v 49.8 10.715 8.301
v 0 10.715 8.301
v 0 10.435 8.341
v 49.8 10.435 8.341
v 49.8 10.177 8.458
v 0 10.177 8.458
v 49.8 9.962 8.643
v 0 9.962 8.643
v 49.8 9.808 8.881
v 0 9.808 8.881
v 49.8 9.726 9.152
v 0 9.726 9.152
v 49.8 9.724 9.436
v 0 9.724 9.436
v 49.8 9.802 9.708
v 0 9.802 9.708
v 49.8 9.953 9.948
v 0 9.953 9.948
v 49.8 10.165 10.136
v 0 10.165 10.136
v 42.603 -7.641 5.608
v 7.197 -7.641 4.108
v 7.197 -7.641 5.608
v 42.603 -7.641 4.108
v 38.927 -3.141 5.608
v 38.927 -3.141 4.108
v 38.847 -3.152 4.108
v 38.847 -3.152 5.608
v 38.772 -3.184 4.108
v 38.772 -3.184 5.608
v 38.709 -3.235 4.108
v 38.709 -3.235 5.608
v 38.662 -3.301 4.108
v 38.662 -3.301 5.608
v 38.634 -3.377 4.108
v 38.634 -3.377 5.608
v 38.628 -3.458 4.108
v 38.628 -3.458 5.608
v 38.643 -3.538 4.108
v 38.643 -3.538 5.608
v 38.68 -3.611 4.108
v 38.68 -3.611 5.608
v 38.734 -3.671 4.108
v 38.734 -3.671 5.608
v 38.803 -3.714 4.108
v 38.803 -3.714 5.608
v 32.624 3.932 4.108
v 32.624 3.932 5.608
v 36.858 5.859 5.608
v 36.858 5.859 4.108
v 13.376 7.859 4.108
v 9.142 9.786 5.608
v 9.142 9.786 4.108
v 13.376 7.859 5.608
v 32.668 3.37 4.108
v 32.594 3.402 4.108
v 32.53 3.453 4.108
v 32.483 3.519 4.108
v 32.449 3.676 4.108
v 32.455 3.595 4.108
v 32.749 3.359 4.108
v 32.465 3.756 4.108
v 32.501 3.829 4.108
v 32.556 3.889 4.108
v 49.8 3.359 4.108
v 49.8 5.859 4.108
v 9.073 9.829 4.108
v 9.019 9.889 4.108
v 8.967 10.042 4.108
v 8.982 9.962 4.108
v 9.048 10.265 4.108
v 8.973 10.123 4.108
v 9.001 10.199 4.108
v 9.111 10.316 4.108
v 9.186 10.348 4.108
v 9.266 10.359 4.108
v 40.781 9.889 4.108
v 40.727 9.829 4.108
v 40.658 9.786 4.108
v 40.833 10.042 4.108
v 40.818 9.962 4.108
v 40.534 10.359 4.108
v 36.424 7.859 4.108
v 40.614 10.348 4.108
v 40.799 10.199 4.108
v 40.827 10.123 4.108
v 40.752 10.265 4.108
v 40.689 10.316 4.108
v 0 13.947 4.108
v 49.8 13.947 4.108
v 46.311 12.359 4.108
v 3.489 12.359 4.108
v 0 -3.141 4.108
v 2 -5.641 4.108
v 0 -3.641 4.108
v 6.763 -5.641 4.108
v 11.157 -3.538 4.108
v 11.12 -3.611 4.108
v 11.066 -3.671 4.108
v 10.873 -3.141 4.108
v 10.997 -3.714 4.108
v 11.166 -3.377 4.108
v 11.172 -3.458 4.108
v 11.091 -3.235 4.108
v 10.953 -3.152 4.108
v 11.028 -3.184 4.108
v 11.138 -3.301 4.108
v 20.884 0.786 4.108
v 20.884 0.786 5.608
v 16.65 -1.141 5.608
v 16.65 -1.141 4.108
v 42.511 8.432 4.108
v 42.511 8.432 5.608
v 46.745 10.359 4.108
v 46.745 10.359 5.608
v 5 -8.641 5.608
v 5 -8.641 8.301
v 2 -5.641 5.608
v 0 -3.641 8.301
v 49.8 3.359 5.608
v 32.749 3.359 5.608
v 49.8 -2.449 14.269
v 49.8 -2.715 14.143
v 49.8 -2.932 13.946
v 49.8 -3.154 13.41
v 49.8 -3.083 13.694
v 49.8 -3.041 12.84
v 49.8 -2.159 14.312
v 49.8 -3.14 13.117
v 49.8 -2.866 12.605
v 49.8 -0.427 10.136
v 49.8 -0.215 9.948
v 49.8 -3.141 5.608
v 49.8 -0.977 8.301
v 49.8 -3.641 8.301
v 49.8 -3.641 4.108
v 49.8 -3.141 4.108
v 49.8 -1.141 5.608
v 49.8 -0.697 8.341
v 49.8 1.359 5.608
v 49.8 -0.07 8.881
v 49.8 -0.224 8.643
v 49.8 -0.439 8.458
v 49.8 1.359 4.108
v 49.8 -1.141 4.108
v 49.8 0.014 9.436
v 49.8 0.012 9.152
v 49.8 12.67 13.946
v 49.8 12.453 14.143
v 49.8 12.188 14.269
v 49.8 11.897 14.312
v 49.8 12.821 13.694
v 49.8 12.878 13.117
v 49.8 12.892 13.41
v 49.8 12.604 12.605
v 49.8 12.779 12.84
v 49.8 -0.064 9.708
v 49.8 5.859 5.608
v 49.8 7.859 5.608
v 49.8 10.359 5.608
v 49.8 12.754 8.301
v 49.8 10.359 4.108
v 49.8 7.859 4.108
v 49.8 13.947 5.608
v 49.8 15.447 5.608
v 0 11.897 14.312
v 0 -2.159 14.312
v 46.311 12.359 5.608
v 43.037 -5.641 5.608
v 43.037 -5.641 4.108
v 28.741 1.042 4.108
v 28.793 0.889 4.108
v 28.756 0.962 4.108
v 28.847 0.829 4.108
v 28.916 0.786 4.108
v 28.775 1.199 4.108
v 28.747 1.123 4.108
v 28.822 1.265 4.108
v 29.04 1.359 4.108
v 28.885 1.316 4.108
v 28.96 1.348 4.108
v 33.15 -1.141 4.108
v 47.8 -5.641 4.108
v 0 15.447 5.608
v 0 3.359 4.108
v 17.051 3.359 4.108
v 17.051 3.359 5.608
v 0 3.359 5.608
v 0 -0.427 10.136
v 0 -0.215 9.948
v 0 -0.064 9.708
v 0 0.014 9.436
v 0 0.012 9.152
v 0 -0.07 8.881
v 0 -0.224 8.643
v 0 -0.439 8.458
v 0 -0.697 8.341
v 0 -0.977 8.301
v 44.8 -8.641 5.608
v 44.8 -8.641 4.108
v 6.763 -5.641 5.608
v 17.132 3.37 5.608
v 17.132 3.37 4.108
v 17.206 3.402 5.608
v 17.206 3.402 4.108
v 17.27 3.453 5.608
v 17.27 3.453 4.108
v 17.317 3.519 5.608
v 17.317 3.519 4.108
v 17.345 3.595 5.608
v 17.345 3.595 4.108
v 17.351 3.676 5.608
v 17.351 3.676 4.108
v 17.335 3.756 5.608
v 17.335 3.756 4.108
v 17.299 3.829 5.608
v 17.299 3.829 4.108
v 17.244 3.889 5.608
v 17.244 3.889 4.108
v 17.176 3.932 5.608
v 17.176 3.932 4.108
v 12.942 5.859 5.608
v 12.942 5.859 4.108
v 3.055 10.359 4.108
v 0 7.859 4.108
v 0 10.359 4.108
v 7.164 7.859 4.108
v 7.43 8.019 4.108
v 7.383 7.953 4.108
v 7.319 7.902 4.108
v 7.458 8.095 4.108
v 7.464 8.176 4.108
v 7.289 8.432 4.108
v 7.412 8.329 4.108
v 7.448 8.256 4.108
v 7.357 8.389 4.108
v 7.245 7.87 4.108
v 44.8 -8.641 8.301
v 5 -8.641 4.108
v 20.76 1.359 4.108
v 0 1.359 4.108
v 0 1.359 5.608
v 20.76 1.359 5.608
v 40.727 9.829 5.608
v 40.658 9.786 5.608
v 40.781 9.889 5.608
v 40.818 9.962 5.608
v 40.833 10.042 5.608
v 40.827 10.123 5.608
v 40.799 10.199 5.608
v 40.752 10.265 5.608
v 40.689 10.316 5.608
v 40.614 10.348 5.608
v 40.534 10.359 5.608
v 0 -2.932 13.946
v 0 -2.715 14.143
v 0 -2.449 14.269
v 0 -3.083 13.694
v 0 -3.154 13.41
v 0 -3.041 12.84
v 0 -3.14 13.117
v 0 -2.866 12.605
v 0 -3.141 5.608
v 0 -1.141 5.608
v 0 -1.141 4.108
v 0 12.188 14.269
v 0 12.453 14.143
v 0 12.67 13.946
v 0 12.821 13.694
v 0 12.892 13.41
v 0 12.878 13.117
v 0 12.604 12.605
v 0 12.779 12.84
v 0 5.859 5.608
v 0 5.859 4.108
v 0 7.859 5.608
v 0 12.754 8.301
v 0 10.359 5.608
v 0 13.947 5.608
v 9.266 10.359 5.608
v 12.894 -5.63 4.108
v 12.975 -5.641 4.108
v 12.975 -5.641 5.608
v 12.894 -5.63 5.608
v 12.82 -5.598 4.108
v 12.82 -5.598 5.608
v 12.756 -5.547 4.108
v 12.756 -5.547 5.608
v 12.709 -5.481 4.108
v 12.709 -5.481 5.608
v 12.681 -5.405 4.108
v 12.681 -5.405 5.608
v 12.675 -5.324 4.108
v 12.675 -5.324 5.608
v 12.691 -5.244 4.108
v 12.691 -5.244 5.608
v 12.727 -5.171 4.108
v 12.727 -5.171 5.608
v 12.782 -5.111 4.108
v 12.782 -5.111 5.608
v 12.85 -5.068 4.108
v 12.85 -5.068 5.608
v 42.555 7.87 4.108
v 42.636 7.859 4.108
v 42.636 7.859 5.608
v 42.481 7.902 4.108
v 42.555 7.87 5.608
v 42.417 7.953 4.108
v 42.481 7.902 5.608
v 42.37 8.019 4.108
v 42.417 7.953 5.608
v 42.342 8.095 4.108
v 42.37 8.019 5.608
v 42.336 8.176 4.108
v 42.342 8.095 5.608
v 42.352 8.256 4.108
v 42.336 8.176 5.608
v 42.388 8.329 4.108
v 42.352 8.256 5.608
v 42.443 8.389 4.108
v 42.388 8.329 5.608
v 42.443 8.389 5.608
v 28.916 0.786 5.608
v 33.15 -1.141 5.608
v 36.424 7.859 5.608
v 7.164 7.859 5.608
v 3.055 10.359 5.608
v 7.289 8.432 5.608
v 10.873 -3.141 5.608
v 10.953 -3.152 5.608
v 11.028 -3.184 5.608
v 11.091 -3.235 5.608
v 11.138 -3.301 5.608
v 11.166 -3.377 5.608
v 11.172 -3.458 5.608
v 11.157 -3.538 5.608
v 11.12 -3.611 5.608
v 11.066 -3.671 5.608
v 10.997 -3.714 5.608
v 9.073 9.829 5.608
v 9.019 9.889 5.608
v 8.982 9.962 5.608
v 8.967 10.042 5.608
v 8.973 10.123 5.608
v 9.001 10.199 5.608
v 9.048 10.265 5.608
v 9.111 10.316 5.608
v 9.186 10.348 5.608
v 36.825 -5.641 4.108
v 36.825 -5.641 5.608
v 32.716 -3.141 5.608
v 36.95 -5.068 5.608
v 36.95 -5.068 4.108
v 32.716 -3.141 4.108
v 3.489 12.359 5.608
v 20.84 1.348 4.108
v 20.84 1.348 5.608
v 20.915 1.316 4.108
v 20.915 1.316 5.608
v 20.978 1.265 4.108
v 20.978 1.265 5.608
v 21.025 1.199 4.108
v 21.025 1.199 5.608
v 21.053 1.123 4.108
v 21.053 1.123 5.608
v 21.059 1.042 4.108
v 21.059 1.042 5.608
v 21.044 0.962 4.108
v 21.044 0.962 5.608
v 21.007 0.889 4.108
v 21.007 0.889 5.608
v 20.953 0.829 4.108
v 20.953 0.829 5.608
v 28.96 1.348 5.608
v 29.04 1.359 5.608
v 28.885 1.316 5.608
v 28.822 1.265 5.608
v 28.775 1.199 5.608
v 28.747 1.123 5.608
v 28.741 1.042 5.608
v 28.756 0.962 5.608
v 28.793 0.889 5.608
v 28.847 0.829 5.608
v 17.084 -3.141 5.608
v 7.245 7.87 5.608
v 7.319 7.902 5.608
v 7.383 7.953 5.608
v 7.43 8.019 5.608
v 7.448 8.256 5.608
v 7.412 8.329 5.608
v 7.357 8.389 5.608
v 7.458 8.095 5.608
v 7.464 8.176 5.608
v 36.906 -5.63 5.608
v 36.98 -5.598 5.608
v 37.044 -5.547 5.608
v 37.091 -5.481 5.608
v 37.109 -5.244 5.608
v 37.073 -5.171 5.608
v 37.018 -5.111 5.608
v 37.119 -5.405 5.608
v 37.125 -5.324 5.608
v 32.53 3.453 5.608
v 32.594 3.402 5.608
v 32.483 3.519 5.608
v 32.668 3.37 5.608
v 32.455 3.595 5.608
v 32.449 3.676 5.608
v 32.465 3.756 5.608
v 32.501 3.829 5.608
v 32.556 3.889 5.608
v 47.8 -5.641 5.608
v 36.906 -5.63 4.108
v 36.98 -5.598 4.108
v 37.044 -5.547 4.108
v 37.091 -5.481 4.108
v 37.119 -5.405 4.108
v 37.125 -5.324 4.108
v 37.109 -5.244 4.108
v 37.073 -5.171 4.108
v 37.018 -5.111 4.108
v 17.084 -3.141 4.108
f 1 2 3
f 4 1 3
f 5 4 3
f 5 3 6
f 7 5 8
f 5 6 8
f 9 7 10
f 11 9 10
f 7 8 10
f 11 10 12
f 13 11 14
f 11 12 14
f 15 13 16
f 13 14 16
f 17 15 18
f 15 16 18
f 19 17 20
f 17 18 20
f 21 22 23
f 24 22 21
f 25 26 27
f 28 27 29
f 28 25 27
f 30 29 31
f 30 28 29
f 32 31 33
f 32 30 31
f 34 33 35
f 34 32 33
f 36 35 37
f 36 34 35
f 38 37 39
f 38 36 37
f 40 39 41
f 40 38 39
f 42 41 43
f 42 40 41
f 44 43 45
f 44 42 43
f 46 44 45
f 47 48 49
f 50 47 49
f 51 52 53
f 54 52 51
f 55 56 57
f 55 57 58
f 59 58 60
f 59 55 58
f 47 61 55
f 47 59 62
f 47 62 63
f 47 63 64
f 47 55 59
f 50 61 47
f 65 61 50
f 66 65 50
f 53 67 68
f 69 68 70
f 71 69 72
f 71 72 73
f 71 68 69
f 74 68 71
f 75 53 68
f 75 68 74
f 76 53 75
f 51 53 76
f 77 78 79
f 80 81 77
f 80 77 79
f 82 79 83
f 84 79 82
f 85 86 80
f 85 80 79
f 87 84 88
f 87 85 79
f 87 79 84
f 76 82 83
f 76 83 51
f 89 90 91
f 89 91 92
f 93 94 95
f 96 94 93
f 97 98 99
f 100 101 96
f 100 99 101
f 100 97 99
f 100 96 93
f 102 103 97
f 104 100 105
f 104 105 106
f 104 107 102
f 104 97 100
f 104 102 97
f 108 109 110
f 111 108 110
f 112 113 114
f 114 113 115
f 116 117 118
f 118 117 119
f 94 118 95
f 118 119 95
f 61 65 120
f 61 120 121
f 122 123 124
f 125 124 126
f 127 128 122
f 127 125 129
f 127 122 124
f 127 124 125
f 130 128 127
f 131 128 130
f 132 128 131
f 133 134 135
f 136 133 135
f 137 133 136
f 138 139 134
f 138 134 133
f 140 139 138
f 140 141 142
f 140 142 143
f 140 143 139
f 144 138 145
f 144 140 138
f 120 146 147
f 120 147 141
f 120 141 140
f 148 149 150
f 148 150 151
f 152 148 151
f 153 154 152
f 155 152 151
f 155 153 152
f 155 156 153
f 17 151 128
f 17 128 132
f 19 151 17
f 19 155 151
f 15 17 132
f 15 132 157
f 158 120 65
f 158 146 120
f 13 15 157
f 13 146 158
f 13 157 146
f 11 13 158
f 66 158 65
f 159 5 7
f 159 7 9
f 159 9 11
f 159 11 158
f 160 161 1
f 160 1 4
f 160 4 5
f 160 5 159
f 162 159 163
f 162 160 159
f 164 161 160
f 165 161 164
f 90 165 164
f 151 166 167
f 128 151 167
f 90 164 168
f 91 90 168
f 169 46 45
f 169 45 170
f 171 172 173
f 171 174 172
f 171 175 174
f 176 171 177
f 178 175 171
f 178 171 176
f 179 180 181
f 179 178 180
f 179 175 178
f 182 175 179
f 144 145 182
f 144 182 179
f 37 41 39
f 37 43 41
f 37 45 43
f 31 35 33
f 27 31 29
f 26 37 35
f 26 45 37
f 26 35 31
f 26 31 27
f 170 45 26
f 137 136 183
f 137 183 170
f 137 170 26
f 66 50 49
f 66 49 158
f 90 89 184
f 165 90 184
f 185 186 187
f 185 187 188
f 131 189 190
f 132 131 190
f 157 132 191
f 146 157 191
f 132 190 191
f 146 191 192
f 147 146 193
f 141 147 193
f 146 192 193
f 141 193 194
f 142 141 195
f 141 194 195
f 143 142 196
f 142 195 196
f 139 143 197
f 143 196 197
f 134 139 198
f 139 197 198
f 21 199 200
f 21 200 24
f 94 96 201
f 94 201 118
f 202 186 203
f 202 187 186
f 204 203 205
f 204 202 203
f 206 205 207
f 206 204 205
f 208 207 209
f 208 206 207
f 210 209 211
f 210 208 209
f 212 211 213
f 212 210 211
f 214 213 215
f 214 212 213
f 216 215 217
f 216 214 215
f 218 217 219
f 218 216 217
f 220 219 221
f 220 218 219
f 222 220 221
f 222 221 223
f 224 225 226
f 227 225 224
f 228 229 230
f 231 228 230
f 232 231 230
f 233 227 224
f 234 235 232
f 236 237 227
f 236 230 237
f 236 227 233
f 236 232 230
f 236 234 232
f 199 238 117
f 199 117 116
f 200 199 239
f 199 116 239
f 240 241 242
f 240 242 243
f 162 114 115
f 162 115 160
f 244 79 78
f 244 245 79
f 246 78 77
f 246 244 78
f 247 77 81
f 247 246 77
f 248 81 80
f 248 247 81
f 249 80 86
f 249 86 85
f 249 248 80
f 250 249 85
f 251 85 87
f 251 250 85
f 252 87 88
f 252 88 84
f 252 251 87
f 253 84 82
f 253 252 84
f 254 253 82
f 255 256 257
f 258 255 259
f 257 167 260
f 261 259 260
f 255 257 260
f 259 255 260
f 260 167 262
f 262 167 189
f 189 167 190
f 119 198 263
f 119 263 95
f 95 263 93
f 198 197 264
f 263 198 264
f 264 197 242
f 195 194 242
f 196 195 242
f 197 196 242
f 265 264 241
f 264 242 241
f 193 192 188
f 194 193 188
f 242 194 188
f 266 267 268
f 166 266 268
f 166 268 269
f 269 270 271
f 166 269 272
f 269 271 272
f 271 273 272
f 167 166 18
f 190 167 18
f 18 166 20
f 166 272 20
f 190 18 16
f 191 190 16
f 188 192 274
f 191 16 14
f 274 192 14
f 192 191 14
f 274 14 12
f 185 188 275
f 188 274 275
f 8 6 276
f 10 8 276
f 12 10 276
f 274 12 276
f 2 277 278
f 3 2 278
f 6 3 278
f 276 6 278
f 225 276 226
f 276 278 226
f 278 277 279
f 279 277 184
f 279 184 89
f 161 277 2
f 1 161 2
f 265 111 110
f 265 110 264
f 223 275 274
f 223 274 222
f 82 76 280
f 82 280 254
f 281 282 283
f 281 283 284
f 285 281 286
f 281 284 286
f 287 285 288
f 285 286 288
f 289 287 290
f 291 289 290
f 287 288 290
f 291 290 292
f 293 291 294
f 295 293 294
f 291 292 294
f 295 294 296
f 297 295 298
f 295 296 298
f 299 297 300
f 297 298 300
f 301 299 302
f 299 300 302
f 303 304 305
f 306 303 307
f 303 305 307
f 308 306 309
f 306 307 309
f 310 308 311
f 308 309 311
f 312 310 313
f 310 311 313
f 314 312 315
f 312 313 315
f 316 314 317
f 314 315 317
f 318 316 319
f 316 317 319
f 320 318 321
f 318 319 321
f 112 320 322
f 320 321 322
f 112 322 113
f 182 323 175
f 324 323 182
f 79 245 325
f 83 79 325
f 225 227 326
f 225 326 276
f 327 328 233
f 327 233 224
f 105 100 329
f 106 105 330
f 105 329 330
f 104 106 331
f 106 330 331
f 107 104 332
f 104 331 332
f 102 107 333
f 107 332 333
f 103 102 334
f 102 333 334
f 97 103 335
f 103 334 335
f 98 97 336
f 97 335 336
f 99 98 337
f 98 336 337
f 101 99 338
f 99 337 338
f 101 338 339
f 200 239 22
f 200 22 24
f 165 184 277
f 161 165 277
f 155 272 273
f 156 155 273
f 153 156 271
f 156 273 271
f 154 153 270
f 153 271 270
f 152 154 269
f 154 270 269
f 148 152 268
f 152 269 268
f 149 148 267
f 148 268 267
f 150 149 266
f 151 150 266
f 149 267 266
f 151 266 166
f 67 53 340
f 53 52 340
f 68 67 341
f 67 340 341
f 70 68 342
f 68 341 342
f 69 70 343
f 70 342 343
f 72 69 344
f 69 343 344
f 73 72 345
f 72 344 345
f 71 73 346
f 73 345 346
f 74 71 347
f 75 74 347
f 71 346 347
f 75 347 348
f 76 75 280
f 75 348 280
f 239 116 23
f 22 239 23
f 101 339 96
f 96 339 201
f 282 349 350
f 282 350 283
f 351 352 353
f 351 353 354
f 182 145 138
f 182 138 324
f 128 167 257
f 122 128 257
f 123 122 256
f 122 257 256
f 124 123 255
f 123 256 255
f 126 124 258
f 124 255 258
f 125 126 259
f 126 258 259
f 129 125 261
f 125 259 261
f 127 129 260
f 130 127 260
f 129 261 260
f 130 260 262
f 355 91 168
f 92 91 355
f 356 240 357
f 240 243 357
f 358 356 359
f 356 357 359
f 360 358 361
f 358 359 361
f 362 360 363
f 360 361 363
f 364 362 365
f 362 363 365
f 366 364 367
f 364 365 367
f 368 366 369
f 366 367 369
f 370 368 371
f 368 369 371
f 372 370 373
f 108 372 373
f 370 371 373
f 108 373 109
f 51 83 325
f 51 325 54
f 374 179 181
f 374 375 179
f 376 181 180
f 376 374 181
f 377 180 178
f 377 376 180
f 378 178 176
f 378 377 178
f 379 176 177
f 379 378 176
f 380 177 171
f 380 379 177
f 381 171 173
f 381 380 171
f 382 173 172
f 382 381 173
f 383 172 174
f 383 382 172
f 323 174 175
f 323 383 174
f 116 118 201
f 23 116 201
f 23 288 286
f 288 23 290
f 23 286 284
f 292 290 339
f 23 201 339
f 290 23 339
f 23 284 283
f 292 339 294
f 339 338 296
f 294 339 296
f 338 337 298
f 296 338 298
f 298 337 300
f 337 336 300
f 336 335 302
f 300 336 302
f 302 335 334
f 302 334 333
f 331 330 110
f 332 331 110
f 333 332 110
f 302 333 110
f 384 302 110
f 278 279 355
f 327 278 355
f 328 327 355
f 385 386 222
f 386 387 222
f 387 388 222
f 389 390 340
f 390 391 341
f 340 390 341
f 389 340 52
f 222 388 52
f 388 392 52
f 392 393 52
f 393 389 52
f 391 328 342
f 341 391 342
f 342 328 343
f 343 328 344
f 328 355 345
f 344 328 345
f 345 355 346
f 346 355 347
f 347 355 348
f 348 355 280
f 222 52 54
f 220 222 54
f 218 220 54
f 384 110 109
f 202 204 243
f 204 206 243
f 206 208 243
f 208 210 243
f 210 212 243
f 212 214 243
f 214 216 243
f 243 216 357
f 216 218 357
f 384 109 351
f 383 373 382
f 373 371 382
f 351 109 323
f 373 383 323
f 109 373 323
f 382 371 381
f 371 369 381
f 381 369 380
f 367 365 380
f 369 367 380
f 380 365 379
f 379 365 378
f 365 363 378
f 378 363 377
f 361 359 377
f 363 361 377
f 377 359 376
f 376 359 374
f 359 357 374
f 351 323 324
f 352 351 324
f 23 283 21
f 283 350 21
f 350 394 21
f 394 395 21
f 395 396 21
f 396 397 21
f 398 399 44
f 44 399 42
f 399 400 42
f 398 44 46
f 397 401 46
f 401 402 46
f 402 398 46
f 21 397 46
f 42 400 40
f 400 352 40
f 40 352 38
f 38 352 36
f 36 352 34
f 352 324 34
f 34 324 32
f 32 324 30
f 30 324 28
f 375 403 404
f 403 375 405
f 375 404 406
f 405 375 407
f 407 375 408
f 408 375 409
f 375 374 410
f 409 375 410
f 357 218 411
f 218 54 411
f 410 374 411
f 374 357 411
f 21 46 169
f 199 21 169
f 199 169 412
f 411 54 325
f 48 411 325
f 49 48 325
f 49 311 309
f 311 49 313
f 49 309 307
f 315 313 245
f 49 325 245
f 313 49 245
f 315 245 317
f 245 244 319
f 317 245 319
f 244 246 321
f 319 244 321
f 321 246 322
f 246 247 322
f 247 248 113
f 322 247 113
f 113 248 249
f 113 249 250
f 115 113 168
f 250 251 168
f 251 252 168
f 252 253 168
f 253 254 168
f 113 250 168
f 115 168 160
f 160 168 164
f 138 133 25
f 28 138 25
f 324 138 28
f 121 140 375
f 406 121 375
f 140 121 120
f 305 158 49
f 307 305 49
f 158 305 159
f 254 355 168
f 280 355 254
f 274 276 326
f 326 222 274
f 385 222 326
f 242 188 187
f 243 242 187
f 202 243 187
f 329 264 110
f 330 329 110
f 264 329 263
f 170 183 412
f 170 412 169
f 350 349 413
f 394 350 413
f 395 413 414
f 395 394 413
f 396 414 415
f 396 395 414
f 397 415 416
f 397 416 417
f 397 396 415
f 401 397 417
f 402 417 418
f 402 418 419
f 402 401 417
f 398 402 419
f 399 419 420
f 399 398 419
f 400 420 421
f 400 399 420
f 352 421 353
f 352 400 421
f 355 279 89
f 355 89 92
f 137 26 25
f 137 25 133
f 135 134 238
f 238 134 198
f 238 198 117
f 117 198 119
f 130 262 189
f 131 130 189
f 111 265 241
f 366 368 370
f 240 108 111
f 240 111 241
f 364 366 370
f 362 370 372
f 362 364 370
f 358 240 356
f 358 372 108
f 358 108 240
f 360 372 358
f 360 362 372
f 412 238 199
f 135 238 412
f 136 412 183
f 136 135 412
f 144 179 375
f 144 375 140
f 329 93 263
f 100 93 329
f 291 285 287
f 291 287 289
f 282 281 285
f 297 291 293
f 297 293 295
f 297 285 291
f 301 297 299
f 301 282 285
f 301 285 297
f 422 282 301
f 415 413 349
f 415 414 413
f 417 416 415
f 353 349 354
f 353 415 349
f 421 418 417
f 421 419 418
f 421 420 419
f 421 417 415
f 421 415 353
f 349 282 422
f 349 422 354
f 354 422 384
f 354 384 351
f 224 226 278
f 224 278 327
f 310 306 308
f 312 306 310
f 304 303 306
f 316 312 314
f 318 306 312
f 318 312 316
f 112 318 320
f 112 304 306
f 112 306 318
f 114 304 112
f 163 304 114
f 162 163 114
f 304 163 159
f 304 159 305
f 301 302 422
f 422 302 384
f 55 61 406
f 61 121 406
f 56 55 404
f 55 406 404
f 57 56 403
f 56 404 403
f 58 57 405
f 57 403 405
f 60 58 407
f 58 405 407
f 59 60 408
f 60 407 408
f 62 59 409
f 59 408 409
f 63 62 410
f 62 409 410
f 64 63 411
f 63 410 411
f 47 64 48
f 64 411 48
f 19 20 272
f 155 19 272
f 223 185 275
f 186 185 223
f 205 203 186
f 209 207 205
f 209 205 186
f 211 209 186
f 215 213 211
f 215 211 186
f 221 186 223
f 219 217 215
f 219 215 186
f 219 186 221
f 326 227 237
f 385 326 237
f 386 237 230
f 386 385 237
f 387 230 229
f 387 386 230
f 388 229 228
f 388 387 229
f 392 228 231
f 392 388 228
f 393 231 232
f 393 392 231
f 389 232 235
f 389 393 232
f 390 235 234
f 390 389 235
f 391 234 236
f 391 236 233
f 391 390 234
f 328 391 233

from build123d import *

# Parameters (mm, degrees)
EXTRUDE_1_DEPTH     = 49.8
CHAMFER_1_SIZE      = 5
CUT_EXTRUDE_1_DEPTH = 49.8
CUT_EXTRUDE_2_DEPTH = 1.5
CUT_EXTRUDE_5_DEPTH = 1.5
CUT_EXTRUDE_6_DEPTH = 1.5
FILLET_1_R          = 0.3


with BuildPart() as part:
    # 草图1 → 凸台-拉伸1 (new body)
    with BuildSketch(Plane(origin=(0, 0, 0), x_dir=(0, 0, -1), z_dir=(1, 0, 0))):
        with BuildLine():
            Line((-3.3011643203984544, 4.869061466212711), (-14.311631849697747, 4.869061466212711))
            Line((-14.311631849697747, 4.869061466212711), (-14.311631849697747, -2.159184752168928))
            ThreePointArc((-14.311631849697747, -2.1591847521689282), (-13.694314644696359, -3.083064362059199), (-12.60452430575002, -2.8662900962872895))
            Line((-12.60452430575002, -2.8662900962872895), (-10.135977537233877, -0.4266270598954794))
            ThreePointArc((-10.135977537233877, -0.42662705989547856), (-10.004086660367205, -0.2658876156487018), (-9.841806105066398, -0.1358976402325789))
            ThreePointArc((-9.841806105066398, -0.1358976402325789), (-8.821917682779581, -0.09946220767270797), (-8.301164320376756, -0.9771386117116159))
            Line((-8.301164320376756, -0.9771386117116161), (-8.301164320376754, -3.01590252304511))
            Line((-8.301164320376754, -3.01590252304511), (-8.301164320376756, -8.640917781834164))
            Line((-8.301164320376756, -8.640917781834164), (-3.3011643203767598, -8.640917781834164))
            Line((-3.30116432037676, -8.640917781834164), (-3.30116432037676, 4.869061466212711))
        make_face()
        with BuildLine():
            ThreePointArc((-8.301164320376754, 10.71526154413704), (-8.821917682779581, 9.837585140098131), (-9.841806105066398, 9.874020572658003))
            ThreePointArc((-9.841806105066398, 9.874020572658003), (-10.004086660367204, 10.004010548074126), (-10.135977537233877, 10.164749992320901))
            Line((-10.135977537233877, 10.164749992320901), (-12.60452430575002, 12.604413028712713))
            ThreePointArc((-12.60452430575002, 12.604413028712713), (-13.694314644696359, 12.821187294484622), (-14.311631849697747, 11.89730768459435))
            Line((-14.311631849697747, 11.89730768459435), (-14.311631849697747, 4.869061466212711))
            Line((-14.311631849697747, 4.869061466212711), (-3.3011643203984544, 4.869061466212711))
            Line((-3.30116432037676, 4.869061466212711), (-3.30116432037676, 13.139889713283024))
            Line((-3.30116432037676, 13.139889713283026), (-5.608236006167775, 15.446957584376776))
            Line((-5.608236006167775, 15.446957584376776), (-8.301164320376754, 12.754025455470533))
            Line((-8.301164320376754, 12.754025455470533), (-8.301164320376756, 10.71526154413704))
        make_face()
    extrude(amount=EXTRUDE_1_DEPTH)

    # 倒角1
    chamfer_1_edges = [part.edges().sort_by_distance(p)[0] for p in [
        (0, -8.640917781834164, 5.801164320376758),
        (49.8, -8.640917781834164, 5.801164320376758),
    ]]
    chamfer(chamfer_1_edges, length=CHAMFER_1_SIZE)

    # 草图3 → 切除-拉伸1 (cut)
    with BuildSketch(Plane(origin=(49.8, 0, 0), x_dir=(0, 0, -1), z_dir=(1, 0, 0))):
        Polygon((-4.108236006167775, 13.94696006459702), (-3.301164320376763, 13.94696006459702), (-3.30116432037676, -8.640917781834164), (-4.108236006167774, -8.640917781834164), align=None)
    extrude(amount=-CUT_EXTRUDE_1_DEPTH, mode=Mode.SUBTRACT)

    # 草图4 → 切除-拉伸2 (cut)
    with BuildSketch(Plane(origin=(0, -4.7e-16, 4.1082360061677745), x_dir=(-1, 0, 0), z_dir=(0, 1.2e-16, -1))):
        Polygon((-49.8, -5.640917781834157), (0, -5.640917781834158), (0, -7.640917781834159), (-49.8, -7.640917781834159), align=None)
        Polygon((-49.80000000000001, -1.1409177818341574), (-1.544e-14, -1.140917781834159), (-1.544e-14, -3.140917781834159), (-49.80000000000001, -3.140917781834159), align=None)
        Polygon((-49.800000000000026, 3.359082218165842), (-3.087e-14, 3.359082218165841), (-3.087e-14, 1.3590822181658406), (-49.800000000000026, 1.3590822181658406), align=None)
        Polygon((-49.80000000000005, 7.859082218165841), (-4.631e-14, 7.859082218165839), (-4.631e-14, 5.859082218165839), (-49.80000000000005, 5.859082218165839), align=None)
        Polygon((-49.80000000000006, 12.359082218165842), (-6.174e-14, 12.35908221816584), (-6.174e-14, 10.35908221816584), (-49.80000000000006, 10.35908221816584), align=None)
    extrude(amount=-CUT_EXTRUDE_2_DEPTH, mode=Mode.SUBTRACT)

    # 草图5 → 切除-拉伸5 (cut)
    with BuildSketch(Plane(origin=(0, 0, 5.608236006167775), x_dir=(-1, 0, 0), z_dir=(0, 0, -1))):
        Polygon((0, 13.94696006459702), (-46.31009994685559, -7.1308178349785605), (-44.799999999999976, -8.640917781834164), (-6.175e-14, 11.749546738532302), align=None)
        Polygon((-49.79999999999993, 11.74954673853228), (-49.8, 13.946960064596997), (-3.489900053144389, -7.13081783497854), (-4.999999999999997, -8.640917781834142), align=None)
    extrude(amount=CUT_EXTRUDE_5_DEPTH, mode=Mode.SUBTRACT)

    # 草图6 → 切除-拉伸6 (cut)
    with BuildSketch(Plane(origin=(0, -4.7e-16, 4.1082360061677745), x_dir=(-1, 0, 0), z_dir=(0, 1.2e-16, -1))):
        Polygon((-28.321709391936835, -1.1409177818341594), (-21.478290608063137, -1.1409177818341603), (-24.89999999999999, 0.41645373502506017), align=None)
        Polygon((-17.76992020746784, 5.85908221816584), (-32.03007979253217, 5.859082218165842), (-26.53731625651111, 3.3590822181658413), (-23.26268374348888, 3.3590822181658413), align=None)
    extrude(amount=-CUT_EXTRUDE_6_DEPTH, mode=Mode.SUBTRACT)

    # 圆角1
    fillet_1_edges = [part.edges().sort_by_distance(p)[0] for p in [
        (41.252239337738956, 7.85908221816584, 4.858236006167775),
        (31.36526497290105, 3.3590822181658417, 4.858236006167775),
        (41.91705415737007, 10.359082218165842, 4.858236006167775),
        (8.547760662261016, 7.85908221816585, 4.858236006167775),
        (7.8829458426299635, 10.359082218165838, 4.858236006167775),
        (22.143105427694266, 1.3590822181658417, 4.858236006167775),
        (12.25613106285637, -3.1409177818341556, 4.858236006167775),
        (11.591316243225233, -5.640917781834158, 4.8582360061677745),
        (27.656894572305735, 1.3590822181658355, 4.858236006167775),
        (37.543868937143614, -3.1409177818341654, 4.858236006167775),
        (38.208683756774704, -5.6409177818341565, 4.8582360061677745),
        (18.434735027098903, 3.3590822181658484, 4.858236006167775),
    ]]
    fillet(fillet_1_edges, radius=FILLET_1_R)


solid = part.part
